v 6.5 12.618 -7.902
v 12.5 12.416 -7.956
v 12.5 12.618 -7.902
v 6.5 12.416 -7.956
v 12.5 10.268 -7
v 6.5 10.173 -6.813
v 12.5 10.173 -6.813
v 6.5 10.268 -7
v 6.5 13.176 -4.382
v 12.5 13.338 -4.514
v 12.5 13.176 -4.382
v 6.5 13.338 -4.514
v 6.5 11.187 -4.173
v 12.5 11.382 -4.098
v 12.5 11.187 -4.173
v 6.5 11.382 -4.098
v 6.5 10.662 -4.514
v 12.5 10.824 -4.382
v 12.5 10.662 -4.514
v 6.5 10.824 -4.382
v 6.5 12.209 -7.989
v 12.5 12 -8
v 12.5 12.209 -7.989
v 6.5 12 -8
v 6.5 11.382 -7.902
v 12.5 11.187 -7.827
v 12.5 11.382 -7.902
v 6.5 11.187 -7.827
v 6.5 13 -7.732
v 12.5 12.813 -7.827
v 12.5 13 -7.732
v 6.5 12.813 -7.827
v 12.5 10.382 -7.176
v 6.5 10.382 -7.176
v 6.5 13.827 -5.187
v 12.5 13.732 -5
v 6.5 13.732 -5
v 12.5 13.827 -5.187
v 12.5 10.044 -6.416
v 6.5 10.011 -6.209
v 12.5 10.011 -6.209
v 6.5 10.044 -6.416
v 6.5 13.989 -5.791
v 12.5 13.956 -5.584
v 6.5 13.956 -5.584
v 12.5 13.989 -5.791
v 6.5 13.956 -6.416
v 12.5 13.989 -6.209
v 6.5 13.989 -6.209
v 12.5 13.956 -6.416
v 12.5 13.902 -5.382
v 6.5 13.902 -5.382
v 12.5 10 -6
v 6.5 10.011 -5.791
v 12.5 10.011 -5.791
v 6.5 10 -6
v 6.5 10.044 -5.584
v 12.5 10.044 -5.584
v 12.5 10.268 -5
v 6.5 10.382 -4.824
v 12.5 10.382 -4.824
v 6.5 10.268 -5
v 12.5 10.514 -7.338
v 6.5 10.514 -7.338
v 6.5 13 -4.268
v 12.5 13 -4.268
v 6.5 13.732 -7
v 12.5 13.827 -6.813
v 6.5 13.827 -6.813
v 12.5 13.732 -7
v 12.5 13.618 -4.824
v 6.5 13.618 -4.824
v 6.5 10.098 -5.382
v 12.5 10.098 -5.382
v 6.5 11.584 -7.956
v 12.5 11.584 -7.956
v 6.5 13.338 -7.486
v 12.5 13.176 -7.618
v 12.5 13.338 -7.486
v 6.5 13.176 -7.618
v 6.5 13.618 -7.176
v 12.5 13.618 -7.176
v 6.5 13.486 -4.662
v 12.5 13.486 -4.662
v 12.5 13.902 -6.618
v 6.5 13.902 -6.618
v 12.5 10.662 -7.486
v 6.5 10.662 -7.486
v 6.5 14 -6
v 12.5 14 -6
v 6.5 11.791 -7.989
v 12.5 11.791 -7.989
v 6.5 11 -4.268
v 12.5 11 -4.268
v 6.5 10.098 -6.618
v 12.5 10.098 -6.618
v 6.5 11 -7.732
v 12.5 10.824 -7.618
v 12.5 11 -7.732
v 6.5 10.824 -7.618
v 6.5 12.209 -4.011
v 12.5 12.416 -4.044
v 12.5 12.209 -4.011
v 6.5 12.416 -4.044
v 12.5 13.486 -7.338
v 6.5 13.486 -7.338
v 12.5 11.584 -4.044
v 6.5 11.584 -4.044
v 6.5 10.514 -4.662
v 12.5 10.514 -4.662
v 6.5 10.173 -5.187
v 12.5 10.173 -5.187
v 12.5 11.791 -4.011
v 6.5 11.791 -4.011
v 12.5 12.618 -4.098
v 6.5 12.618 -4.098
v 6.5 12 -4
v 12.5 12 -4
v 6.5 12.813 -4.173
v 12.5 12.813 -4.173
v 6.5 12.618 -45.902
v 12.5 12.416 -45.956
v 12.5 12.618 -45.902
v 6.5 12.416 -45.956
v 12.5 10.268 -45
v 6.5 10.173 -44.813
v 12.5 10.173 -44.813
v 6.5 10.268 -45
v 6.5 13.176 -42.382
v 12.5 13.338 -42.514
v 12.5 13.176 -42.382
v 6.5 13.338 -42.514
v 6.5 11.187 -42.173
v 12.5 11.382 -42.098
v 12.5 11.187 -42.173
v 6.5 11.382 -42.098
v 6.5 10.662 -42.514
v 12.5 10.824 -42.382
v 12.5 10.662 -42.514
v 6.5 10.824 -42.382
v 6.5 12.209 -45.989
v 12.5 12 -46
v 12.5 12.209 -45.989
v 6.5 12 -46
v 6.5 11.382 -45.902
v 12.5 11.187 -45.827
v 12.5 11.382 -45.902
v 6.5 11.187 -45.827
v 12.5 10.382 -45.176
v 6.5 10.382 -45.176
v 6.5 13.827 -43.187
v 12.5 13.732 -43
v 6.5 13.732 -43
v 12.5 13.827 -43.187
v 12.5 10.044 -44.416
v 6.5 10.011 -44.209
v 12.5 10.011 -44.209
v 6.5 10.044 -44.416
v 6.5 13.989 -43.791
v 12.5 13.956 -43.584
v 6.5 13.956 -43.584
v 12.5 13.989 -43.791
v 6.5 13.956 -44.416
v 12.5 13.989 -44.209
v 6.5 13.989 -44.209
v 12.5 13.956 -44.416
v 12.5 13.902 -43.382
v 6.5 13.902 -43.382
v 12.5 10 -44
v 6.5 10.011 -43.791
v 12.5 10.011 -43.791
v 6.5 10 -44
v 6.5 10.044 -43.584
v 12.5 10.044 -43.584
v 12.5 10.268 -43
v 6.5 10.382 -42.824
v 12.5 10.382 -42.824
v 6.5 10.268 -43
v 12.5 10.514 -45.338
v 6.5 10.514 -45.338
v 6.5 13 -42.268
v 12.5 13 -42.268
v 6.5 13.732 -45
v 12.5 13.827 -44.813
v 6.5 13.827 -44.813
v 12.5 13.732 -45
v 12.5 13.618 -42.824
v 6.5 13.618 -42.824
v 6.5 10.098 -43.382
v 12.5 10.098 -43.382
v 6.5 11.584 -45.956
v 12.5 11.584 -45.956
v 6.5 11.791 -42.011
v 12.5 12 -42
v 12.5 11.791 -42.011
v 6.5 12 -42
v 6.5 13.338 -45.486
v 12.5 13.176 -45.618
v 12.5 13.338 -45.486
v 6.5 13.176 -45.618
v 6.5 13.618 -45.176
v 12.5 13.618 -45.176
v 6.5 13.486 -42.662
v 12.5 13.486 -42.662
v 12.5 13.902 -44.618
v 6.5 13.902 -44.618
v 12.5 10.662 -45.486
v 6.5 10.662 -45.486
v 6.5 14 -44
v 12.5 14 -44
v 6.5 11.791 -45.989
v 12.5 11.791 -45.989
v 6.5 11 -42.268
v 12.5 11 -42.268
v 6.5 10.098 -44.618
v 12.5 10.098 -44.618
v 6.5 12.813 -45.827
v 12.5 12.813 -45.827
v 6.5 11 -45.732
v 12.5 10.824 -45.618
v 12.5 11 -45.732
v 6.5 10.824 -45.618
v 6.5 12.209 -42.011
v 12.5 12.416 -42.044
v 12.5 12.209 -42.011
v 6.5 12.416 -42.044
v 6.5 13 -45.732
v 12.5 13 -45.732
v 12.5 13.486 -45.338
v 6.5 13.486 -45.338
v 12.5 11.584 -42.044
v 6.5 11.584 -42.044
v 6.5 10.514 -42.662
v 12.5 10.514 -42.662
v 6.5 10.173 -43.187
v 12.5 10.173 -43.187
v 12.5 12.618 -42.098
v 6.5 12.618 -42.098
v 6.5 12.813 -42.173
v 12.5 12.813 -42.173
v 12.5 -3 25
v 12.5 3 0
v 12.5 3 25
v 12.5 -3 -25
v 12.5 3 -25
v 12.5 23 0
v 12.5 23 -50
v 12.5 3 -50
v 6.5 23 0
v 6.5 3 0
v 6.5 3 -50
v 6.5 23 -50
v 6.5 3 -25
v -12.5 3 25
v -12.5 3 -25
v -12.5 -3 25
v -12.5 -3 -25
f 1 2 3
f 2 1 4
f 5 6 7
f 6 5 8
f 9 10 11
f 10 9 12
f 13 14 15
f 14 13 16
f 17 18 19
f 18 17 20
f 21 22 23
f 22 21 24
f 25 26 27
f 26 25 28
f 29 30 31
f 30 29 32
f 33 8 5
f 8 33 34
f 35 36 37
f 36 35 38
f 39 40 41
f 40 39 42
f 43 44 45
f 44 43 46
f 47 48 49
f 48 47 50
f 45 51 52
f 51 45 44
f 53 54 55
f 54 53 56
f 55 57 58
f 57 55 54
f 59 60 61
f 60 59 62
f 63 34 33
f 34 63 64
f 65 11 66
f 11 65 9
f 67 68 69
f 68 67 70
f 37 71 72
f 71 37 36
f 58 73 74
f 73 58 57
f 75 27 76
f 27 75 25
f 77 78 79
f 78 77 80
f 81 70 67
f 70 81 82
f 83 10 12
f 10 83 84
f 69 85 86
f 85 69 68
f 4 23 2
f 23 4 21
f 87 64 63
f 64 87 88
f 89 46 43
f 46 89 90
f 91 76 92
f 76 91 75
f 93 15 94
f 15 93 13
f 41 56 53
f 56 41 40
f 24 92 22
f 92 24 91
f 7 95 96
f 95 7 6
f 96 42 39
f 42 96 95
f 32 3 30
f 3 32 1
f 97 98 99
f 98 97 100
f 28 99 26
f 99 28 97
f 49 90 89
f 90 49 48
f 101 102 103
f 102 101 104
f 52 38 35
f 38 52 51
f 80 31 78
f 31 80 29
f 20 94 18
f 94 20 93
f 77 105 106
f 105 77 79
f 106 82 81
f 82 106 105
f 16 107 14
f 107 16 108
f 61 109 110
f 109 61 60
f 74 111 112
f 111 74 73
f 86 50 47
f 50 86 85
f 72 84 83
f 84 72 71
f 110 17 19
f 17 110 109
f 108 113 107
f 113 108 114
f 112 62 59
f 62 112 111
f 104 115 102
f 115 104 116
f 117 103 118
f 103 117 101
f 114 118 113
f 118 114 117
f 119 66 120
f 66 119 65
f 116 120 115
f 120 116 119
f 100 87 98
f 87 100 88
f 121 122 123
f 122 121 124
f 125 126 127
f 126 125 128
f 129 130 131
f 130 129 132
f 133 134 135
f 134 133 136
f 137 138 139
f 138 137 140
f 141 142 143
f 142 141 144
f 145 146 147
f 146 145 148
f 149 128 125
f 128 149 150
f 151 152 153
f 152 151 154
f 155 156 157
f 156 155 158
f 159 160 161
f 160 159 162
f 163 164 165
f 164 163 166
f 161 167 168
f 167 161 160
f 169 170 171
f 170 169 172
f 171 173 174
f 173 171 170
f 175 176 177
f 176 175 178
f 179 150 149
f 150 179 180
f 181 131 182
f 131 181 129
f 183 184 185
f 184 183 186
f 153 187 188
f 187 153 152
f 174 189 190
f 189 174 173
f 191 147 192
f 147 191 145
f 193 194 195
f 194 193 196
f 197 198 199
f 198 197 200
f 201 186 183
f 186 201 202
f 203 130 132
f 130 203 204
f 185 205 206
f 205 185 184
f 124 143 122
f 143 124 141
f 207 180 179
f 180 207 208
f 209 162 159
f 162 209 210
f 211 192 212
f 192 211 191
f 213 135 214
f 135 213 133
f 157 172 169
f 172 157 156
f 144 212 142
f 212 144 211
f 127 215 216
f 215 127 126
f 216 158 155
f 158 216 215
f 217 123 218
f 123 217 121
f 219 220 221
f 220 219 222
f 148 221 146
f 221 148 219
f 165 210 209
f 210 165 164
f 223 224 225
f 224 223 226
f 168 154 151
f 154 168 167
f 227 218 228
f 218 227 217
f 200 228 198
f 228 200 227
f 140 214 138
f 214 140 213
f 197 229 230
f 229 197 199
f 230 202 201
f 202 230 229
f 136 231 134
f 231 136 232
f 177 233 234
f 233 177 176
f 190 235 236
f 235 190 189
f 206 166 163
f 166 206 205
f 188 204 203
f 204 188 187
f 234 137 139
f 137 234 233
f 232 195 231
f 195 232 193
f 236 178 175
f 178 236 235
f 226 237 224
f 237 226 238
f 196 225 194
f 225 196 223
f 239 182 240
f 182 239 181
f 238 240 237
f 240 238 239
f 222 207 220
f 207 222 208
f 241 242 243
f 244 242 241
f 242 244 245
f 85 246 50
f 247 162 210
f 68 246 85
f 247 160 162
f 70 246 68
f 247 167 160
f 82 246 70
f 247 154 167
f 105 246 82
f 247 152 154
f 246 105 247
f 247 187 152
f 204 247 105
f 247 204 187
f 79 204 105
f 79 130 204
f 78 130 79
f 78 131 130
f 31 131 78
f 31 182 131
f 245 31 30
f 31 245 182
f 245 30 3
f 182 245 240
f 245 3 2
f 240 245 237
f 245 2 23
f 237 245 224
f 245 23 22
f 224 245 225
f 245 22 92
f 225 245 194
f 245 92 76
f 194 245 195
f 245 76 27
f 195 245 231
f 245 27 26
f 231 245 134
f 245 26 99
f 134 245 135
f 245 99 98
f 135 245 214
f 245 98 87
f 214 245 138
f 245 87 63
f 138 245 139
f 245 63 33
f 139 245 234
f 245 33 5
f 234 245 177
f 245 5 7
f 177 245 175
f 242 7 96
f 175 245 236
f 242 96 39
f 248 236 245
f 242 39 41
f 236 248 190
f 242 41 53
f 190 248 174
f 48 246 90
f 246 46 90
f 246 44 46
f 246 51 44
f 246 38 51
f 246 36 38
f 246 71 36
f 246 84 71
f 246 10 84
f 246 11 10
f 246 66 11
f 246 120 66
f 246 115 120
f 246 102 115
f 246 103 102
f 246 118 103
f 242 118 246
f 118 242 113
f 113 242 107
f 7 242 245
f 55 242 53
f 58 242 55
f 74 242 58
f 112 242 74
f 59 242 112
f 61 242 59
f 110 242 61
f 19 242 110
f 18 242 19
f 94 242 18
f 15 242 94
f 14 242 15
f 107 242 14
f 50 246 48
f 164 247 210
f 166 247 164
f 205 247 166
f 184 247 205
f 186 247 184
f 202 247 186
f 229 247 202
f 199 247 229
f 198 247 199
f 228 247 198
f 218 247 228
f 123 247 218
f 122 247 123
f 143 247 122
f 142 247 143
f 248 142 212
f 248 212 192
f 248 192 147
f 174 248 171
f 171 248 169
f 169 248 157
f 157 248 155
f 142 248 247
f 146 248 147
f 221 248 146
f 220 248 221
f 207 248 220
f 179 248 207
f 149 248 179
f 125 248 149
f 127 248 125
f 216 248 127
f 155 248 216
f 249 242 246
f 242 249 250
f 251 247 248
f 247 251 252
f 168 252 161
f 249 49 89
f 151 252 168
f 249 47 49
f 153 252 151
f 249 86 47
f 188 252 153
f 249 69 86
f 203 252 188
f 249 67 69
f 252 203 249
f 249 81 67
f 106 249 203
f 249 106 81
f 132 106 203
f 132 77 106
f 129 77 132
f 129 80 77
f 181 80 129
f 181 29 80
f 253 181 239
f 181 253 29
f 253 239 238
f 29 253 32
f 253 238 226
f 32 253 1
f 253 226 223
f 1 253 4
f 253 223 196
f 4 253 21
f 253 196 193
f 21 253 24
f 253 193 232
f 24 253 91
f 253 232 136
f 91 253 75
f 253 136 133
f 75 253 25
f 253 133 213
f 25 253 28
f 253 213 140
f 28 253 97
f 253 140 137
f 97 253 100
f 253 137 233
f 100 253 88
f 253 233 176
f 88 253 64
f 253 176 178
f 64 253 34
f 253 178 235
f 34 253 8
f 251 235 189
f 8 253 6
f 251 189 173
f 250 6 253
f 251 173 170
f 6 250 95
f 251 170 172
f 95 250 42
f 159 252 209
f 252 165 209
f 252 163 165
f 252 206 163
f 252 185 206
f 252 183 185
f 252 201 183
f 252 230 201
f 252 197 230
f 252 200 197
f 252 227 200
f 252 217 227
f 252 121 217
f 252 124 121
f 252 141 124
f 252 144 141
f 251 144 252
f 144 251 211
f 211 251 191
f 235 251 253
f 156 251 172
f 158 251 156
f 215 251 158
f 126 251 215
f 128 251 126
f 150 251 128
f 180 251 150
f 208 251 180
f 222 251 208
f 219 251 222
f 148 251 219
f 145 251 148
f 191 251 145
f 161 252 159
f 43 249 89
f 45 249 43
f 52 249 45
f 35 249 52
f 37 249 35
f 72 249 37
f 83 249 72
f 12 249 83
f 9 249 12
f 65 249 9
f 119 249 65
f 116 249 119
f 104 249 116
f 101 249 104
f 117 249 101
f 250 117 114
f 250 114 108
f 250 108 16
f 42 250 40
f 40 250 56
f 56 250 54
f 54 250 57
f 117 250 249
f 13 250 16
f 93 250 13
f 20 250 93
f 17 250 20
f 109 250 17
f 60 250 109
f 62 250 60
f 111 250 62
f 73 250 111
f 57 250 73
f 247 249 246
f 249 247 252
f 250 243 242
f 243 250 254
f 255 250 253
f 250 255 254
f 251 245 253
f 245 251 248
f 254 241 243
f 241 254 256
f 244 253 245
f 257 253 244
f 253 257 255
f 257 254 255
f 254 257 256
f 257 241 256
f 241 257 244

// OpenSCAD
$fn = 60;
base_block_width = 25;
base_block_height = 50;
base_block_thickness = 6;

mount_block_width = 6;
mount_block_height = 50;
mount_block_thickness = 20;

hole_radius = 2;



module base_block() {
    cube([base_block_width, , base_block_thickness, base_block_height], center = true);

}

module mount_block() {
    translate([base_block_width/2-mount_block_width/2,
                mount_block_thickness/2 + base_block_thickness/2, 
                -base_block_height/2]) {
        cube([mount_block_width, 
                    mount_block_thickness, 
                    mount_block_height], center=true);
    }

}

module mount_block_holes() {
    edge_distance = hole_radius * 3;
    for(z = [-edge_distance, -mount_block_height+edge_distance]) {
        translate([base_block_width/2, mount_block_thickness*0.6, z]) {
            rotate([0, 90, 0]) cylinder(h = mount_block_width+10, r = hole_radius, center = true);
        }
    } 
}

module mount() {
    base_block();
    difference() {
        mount_block();
        mount_block_holes();
    }
}

mount();
//translate([0, 50, 0]) mirror([0, 1, 0]) mount();
